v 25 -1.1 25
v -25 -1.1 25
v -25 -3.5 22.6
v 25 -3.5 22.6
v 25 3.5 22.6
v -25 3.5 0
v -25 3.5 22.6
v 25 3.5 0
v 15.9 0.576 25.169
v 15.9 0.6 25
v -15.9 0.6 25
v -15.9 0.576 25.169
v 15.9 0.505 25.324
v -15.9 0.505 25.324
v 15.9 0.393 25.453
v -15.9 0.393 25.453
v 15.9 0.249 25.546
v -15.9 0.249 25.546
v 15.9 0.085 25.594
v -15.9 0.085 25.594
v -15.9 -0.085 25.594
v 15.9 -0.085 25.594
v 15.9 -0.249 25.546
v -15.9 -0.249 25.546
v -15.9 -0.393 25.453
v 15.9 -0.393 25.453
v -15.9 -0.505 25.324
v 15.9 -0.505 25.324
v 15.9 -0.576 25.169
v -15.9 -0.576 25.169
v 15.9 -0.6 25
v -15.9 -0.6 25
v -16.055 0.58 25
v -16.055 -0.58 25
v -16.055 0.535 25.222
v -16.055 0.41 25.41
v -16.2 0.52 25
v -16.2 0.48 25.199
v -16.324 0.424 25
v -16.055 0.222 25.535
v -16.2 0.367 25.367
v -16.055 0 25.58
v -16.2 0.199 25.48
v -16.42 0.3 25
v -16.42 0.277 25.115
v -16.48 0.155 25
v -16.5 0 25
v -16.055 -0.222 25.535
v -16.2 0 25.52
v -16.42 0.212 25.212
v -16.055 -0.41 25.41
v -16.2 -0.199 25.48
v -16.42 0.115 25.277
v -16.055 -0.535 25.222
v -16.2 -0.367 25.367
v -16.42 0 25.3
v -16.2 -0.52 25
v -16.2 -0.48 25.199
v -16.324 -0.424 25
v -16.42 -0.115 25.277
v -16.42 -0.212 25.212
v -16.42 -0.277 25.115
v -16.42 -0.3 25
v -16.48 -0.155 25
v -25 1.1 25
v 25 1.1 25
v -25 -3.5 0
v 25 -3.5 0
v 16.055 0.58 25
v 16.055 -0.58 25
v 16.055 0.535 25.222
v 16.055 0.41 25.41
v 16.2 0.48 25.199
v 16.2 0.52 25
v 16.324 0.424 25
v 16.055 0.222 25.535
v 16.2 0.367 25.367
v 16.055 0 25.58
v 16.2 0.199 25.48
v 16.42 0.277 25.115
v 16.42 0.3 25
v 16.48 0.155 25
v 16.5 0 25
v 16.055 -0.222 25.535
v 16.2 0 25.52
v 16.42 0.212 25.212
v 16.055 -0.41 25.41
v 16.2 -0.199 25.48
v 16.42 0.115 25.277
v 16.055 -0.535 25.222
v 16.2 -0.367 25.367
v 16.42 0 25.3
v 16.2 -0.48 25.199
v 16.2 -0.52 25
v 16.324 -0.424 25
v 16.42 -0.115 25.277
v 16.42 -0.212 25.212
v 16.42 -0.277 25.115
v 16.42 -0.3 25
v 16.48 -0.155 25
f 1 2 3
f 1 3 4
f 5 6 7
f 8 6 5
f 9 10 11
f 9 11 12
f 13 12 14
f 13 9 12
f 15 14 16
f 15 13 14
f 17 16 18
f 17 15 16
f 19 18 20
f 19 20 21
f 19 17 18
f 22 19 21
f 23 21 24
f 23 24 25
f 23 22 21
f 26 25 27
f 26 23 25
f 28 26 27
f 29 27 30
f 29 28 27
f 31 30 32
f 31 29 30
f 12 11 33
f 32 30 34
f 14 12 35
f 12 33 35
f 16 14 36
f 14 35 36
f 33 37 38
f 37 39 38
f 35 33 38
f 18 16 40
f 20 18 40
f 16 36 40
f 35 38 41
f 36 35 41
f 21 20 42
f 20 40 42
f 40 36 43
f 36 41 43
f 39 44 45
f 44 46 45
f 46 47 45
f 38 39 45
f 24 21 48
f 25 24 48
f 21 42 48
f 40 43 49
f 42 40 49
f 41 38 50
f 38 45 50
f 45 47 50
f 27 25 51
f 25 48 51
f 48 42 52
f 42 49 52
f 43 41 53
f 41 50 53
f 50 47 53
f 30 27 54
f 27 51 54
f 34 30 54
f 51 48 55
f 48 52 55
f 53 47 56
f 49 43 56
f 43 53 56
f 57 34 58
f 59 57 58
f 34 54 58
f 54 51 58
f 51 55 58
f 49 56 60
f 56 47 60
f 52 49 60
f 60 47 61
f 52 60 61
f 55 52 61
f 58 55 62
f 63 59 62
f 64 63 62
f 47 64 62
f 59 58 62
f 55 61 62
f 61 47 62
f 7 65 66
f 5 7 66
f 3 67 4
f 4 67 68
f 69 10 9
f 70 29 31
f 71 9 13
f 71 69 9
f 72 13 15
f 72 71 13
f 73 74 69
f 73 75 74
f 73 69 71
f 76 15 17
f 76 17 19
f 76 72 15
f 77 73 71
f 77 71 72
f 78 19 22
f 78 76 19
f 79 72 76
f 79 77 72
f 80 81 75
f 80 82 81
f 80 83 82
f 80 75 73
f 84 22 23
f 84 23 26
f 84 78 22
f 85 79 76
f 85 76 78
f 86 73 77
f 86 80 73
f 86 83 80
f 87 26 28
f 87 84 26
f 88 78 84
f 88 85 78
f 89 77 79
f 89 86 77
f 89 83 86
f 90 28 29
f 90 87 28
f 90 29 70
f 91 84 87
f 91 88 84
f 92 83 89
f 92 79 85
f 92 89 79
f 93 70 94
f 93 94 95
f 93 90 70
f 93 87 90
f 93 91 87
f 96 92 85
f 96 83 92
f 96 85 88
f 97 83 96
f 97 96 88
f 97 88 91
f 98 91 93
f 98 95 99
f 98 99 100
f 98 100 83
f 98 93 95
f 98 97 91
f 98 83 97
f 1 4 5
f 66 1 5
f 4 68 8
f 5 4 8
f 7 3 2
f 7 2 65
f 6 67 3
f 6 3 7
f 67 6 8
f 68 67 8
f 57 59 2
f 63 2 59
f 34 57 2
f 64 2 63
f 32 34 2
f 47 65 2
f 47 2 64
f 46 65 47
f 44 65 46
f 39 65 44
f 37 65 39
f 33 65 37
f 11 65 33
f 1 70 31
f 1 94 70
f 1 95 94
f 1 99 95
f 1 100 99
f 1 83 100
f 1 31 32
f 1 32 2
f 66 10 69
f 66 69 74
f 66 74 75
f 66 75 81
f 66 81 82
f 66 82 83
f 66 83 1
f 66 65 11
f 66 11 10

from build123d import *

# Parameters (mm, degrees)
F0_W     = 50
F0_H     = 7
F1_DEPTH = 25
F2_SIZE  = 2.4
F3_R     = 0.6
F4_DEPTH = 16.5
F5_R     = 0.59999


# Not quite as in the source:
# - a fillet or chamfer is up to 0.001 mm smaller than in the source, because OpenCascade refuses the exact size


with BuildPart() as f1:
    # F0 (on Top) → F1 (new body)
    with BuildSketch(Plane.XY):
        Rectangle(F0_W, F0_H)
    extrude(amount=F1_DEPTH)

    # F2
    f2_edges = [f1.edges().sort_by_distance(p)[0] for p in [
        (0, -3.5, 25),
        (0, 3.5, 25),
    ]]
    chamfer(f2_edges, length=F2_SIZE)

    # F3 (on Right) → F4 (join, symmetric)
    with BuildSketch(Plane.YZ):
        with Locations((0, 25)):
            Circle(F3_R)
    extrude(amount=F4_DEPTH, both=True)

    # F5 (radius 0.6 in the source; OpenCascade refuses exactly that, so slightly less here)
    f5_edges = [f1.edges().sort_by_distance(p)[0] for p in [
        (16.5, 0, 25.6),
        (-16.5, 0, 25.6),
    ]]
    fillet(f5_edges, radius=F5_R)


solid = f1.part
